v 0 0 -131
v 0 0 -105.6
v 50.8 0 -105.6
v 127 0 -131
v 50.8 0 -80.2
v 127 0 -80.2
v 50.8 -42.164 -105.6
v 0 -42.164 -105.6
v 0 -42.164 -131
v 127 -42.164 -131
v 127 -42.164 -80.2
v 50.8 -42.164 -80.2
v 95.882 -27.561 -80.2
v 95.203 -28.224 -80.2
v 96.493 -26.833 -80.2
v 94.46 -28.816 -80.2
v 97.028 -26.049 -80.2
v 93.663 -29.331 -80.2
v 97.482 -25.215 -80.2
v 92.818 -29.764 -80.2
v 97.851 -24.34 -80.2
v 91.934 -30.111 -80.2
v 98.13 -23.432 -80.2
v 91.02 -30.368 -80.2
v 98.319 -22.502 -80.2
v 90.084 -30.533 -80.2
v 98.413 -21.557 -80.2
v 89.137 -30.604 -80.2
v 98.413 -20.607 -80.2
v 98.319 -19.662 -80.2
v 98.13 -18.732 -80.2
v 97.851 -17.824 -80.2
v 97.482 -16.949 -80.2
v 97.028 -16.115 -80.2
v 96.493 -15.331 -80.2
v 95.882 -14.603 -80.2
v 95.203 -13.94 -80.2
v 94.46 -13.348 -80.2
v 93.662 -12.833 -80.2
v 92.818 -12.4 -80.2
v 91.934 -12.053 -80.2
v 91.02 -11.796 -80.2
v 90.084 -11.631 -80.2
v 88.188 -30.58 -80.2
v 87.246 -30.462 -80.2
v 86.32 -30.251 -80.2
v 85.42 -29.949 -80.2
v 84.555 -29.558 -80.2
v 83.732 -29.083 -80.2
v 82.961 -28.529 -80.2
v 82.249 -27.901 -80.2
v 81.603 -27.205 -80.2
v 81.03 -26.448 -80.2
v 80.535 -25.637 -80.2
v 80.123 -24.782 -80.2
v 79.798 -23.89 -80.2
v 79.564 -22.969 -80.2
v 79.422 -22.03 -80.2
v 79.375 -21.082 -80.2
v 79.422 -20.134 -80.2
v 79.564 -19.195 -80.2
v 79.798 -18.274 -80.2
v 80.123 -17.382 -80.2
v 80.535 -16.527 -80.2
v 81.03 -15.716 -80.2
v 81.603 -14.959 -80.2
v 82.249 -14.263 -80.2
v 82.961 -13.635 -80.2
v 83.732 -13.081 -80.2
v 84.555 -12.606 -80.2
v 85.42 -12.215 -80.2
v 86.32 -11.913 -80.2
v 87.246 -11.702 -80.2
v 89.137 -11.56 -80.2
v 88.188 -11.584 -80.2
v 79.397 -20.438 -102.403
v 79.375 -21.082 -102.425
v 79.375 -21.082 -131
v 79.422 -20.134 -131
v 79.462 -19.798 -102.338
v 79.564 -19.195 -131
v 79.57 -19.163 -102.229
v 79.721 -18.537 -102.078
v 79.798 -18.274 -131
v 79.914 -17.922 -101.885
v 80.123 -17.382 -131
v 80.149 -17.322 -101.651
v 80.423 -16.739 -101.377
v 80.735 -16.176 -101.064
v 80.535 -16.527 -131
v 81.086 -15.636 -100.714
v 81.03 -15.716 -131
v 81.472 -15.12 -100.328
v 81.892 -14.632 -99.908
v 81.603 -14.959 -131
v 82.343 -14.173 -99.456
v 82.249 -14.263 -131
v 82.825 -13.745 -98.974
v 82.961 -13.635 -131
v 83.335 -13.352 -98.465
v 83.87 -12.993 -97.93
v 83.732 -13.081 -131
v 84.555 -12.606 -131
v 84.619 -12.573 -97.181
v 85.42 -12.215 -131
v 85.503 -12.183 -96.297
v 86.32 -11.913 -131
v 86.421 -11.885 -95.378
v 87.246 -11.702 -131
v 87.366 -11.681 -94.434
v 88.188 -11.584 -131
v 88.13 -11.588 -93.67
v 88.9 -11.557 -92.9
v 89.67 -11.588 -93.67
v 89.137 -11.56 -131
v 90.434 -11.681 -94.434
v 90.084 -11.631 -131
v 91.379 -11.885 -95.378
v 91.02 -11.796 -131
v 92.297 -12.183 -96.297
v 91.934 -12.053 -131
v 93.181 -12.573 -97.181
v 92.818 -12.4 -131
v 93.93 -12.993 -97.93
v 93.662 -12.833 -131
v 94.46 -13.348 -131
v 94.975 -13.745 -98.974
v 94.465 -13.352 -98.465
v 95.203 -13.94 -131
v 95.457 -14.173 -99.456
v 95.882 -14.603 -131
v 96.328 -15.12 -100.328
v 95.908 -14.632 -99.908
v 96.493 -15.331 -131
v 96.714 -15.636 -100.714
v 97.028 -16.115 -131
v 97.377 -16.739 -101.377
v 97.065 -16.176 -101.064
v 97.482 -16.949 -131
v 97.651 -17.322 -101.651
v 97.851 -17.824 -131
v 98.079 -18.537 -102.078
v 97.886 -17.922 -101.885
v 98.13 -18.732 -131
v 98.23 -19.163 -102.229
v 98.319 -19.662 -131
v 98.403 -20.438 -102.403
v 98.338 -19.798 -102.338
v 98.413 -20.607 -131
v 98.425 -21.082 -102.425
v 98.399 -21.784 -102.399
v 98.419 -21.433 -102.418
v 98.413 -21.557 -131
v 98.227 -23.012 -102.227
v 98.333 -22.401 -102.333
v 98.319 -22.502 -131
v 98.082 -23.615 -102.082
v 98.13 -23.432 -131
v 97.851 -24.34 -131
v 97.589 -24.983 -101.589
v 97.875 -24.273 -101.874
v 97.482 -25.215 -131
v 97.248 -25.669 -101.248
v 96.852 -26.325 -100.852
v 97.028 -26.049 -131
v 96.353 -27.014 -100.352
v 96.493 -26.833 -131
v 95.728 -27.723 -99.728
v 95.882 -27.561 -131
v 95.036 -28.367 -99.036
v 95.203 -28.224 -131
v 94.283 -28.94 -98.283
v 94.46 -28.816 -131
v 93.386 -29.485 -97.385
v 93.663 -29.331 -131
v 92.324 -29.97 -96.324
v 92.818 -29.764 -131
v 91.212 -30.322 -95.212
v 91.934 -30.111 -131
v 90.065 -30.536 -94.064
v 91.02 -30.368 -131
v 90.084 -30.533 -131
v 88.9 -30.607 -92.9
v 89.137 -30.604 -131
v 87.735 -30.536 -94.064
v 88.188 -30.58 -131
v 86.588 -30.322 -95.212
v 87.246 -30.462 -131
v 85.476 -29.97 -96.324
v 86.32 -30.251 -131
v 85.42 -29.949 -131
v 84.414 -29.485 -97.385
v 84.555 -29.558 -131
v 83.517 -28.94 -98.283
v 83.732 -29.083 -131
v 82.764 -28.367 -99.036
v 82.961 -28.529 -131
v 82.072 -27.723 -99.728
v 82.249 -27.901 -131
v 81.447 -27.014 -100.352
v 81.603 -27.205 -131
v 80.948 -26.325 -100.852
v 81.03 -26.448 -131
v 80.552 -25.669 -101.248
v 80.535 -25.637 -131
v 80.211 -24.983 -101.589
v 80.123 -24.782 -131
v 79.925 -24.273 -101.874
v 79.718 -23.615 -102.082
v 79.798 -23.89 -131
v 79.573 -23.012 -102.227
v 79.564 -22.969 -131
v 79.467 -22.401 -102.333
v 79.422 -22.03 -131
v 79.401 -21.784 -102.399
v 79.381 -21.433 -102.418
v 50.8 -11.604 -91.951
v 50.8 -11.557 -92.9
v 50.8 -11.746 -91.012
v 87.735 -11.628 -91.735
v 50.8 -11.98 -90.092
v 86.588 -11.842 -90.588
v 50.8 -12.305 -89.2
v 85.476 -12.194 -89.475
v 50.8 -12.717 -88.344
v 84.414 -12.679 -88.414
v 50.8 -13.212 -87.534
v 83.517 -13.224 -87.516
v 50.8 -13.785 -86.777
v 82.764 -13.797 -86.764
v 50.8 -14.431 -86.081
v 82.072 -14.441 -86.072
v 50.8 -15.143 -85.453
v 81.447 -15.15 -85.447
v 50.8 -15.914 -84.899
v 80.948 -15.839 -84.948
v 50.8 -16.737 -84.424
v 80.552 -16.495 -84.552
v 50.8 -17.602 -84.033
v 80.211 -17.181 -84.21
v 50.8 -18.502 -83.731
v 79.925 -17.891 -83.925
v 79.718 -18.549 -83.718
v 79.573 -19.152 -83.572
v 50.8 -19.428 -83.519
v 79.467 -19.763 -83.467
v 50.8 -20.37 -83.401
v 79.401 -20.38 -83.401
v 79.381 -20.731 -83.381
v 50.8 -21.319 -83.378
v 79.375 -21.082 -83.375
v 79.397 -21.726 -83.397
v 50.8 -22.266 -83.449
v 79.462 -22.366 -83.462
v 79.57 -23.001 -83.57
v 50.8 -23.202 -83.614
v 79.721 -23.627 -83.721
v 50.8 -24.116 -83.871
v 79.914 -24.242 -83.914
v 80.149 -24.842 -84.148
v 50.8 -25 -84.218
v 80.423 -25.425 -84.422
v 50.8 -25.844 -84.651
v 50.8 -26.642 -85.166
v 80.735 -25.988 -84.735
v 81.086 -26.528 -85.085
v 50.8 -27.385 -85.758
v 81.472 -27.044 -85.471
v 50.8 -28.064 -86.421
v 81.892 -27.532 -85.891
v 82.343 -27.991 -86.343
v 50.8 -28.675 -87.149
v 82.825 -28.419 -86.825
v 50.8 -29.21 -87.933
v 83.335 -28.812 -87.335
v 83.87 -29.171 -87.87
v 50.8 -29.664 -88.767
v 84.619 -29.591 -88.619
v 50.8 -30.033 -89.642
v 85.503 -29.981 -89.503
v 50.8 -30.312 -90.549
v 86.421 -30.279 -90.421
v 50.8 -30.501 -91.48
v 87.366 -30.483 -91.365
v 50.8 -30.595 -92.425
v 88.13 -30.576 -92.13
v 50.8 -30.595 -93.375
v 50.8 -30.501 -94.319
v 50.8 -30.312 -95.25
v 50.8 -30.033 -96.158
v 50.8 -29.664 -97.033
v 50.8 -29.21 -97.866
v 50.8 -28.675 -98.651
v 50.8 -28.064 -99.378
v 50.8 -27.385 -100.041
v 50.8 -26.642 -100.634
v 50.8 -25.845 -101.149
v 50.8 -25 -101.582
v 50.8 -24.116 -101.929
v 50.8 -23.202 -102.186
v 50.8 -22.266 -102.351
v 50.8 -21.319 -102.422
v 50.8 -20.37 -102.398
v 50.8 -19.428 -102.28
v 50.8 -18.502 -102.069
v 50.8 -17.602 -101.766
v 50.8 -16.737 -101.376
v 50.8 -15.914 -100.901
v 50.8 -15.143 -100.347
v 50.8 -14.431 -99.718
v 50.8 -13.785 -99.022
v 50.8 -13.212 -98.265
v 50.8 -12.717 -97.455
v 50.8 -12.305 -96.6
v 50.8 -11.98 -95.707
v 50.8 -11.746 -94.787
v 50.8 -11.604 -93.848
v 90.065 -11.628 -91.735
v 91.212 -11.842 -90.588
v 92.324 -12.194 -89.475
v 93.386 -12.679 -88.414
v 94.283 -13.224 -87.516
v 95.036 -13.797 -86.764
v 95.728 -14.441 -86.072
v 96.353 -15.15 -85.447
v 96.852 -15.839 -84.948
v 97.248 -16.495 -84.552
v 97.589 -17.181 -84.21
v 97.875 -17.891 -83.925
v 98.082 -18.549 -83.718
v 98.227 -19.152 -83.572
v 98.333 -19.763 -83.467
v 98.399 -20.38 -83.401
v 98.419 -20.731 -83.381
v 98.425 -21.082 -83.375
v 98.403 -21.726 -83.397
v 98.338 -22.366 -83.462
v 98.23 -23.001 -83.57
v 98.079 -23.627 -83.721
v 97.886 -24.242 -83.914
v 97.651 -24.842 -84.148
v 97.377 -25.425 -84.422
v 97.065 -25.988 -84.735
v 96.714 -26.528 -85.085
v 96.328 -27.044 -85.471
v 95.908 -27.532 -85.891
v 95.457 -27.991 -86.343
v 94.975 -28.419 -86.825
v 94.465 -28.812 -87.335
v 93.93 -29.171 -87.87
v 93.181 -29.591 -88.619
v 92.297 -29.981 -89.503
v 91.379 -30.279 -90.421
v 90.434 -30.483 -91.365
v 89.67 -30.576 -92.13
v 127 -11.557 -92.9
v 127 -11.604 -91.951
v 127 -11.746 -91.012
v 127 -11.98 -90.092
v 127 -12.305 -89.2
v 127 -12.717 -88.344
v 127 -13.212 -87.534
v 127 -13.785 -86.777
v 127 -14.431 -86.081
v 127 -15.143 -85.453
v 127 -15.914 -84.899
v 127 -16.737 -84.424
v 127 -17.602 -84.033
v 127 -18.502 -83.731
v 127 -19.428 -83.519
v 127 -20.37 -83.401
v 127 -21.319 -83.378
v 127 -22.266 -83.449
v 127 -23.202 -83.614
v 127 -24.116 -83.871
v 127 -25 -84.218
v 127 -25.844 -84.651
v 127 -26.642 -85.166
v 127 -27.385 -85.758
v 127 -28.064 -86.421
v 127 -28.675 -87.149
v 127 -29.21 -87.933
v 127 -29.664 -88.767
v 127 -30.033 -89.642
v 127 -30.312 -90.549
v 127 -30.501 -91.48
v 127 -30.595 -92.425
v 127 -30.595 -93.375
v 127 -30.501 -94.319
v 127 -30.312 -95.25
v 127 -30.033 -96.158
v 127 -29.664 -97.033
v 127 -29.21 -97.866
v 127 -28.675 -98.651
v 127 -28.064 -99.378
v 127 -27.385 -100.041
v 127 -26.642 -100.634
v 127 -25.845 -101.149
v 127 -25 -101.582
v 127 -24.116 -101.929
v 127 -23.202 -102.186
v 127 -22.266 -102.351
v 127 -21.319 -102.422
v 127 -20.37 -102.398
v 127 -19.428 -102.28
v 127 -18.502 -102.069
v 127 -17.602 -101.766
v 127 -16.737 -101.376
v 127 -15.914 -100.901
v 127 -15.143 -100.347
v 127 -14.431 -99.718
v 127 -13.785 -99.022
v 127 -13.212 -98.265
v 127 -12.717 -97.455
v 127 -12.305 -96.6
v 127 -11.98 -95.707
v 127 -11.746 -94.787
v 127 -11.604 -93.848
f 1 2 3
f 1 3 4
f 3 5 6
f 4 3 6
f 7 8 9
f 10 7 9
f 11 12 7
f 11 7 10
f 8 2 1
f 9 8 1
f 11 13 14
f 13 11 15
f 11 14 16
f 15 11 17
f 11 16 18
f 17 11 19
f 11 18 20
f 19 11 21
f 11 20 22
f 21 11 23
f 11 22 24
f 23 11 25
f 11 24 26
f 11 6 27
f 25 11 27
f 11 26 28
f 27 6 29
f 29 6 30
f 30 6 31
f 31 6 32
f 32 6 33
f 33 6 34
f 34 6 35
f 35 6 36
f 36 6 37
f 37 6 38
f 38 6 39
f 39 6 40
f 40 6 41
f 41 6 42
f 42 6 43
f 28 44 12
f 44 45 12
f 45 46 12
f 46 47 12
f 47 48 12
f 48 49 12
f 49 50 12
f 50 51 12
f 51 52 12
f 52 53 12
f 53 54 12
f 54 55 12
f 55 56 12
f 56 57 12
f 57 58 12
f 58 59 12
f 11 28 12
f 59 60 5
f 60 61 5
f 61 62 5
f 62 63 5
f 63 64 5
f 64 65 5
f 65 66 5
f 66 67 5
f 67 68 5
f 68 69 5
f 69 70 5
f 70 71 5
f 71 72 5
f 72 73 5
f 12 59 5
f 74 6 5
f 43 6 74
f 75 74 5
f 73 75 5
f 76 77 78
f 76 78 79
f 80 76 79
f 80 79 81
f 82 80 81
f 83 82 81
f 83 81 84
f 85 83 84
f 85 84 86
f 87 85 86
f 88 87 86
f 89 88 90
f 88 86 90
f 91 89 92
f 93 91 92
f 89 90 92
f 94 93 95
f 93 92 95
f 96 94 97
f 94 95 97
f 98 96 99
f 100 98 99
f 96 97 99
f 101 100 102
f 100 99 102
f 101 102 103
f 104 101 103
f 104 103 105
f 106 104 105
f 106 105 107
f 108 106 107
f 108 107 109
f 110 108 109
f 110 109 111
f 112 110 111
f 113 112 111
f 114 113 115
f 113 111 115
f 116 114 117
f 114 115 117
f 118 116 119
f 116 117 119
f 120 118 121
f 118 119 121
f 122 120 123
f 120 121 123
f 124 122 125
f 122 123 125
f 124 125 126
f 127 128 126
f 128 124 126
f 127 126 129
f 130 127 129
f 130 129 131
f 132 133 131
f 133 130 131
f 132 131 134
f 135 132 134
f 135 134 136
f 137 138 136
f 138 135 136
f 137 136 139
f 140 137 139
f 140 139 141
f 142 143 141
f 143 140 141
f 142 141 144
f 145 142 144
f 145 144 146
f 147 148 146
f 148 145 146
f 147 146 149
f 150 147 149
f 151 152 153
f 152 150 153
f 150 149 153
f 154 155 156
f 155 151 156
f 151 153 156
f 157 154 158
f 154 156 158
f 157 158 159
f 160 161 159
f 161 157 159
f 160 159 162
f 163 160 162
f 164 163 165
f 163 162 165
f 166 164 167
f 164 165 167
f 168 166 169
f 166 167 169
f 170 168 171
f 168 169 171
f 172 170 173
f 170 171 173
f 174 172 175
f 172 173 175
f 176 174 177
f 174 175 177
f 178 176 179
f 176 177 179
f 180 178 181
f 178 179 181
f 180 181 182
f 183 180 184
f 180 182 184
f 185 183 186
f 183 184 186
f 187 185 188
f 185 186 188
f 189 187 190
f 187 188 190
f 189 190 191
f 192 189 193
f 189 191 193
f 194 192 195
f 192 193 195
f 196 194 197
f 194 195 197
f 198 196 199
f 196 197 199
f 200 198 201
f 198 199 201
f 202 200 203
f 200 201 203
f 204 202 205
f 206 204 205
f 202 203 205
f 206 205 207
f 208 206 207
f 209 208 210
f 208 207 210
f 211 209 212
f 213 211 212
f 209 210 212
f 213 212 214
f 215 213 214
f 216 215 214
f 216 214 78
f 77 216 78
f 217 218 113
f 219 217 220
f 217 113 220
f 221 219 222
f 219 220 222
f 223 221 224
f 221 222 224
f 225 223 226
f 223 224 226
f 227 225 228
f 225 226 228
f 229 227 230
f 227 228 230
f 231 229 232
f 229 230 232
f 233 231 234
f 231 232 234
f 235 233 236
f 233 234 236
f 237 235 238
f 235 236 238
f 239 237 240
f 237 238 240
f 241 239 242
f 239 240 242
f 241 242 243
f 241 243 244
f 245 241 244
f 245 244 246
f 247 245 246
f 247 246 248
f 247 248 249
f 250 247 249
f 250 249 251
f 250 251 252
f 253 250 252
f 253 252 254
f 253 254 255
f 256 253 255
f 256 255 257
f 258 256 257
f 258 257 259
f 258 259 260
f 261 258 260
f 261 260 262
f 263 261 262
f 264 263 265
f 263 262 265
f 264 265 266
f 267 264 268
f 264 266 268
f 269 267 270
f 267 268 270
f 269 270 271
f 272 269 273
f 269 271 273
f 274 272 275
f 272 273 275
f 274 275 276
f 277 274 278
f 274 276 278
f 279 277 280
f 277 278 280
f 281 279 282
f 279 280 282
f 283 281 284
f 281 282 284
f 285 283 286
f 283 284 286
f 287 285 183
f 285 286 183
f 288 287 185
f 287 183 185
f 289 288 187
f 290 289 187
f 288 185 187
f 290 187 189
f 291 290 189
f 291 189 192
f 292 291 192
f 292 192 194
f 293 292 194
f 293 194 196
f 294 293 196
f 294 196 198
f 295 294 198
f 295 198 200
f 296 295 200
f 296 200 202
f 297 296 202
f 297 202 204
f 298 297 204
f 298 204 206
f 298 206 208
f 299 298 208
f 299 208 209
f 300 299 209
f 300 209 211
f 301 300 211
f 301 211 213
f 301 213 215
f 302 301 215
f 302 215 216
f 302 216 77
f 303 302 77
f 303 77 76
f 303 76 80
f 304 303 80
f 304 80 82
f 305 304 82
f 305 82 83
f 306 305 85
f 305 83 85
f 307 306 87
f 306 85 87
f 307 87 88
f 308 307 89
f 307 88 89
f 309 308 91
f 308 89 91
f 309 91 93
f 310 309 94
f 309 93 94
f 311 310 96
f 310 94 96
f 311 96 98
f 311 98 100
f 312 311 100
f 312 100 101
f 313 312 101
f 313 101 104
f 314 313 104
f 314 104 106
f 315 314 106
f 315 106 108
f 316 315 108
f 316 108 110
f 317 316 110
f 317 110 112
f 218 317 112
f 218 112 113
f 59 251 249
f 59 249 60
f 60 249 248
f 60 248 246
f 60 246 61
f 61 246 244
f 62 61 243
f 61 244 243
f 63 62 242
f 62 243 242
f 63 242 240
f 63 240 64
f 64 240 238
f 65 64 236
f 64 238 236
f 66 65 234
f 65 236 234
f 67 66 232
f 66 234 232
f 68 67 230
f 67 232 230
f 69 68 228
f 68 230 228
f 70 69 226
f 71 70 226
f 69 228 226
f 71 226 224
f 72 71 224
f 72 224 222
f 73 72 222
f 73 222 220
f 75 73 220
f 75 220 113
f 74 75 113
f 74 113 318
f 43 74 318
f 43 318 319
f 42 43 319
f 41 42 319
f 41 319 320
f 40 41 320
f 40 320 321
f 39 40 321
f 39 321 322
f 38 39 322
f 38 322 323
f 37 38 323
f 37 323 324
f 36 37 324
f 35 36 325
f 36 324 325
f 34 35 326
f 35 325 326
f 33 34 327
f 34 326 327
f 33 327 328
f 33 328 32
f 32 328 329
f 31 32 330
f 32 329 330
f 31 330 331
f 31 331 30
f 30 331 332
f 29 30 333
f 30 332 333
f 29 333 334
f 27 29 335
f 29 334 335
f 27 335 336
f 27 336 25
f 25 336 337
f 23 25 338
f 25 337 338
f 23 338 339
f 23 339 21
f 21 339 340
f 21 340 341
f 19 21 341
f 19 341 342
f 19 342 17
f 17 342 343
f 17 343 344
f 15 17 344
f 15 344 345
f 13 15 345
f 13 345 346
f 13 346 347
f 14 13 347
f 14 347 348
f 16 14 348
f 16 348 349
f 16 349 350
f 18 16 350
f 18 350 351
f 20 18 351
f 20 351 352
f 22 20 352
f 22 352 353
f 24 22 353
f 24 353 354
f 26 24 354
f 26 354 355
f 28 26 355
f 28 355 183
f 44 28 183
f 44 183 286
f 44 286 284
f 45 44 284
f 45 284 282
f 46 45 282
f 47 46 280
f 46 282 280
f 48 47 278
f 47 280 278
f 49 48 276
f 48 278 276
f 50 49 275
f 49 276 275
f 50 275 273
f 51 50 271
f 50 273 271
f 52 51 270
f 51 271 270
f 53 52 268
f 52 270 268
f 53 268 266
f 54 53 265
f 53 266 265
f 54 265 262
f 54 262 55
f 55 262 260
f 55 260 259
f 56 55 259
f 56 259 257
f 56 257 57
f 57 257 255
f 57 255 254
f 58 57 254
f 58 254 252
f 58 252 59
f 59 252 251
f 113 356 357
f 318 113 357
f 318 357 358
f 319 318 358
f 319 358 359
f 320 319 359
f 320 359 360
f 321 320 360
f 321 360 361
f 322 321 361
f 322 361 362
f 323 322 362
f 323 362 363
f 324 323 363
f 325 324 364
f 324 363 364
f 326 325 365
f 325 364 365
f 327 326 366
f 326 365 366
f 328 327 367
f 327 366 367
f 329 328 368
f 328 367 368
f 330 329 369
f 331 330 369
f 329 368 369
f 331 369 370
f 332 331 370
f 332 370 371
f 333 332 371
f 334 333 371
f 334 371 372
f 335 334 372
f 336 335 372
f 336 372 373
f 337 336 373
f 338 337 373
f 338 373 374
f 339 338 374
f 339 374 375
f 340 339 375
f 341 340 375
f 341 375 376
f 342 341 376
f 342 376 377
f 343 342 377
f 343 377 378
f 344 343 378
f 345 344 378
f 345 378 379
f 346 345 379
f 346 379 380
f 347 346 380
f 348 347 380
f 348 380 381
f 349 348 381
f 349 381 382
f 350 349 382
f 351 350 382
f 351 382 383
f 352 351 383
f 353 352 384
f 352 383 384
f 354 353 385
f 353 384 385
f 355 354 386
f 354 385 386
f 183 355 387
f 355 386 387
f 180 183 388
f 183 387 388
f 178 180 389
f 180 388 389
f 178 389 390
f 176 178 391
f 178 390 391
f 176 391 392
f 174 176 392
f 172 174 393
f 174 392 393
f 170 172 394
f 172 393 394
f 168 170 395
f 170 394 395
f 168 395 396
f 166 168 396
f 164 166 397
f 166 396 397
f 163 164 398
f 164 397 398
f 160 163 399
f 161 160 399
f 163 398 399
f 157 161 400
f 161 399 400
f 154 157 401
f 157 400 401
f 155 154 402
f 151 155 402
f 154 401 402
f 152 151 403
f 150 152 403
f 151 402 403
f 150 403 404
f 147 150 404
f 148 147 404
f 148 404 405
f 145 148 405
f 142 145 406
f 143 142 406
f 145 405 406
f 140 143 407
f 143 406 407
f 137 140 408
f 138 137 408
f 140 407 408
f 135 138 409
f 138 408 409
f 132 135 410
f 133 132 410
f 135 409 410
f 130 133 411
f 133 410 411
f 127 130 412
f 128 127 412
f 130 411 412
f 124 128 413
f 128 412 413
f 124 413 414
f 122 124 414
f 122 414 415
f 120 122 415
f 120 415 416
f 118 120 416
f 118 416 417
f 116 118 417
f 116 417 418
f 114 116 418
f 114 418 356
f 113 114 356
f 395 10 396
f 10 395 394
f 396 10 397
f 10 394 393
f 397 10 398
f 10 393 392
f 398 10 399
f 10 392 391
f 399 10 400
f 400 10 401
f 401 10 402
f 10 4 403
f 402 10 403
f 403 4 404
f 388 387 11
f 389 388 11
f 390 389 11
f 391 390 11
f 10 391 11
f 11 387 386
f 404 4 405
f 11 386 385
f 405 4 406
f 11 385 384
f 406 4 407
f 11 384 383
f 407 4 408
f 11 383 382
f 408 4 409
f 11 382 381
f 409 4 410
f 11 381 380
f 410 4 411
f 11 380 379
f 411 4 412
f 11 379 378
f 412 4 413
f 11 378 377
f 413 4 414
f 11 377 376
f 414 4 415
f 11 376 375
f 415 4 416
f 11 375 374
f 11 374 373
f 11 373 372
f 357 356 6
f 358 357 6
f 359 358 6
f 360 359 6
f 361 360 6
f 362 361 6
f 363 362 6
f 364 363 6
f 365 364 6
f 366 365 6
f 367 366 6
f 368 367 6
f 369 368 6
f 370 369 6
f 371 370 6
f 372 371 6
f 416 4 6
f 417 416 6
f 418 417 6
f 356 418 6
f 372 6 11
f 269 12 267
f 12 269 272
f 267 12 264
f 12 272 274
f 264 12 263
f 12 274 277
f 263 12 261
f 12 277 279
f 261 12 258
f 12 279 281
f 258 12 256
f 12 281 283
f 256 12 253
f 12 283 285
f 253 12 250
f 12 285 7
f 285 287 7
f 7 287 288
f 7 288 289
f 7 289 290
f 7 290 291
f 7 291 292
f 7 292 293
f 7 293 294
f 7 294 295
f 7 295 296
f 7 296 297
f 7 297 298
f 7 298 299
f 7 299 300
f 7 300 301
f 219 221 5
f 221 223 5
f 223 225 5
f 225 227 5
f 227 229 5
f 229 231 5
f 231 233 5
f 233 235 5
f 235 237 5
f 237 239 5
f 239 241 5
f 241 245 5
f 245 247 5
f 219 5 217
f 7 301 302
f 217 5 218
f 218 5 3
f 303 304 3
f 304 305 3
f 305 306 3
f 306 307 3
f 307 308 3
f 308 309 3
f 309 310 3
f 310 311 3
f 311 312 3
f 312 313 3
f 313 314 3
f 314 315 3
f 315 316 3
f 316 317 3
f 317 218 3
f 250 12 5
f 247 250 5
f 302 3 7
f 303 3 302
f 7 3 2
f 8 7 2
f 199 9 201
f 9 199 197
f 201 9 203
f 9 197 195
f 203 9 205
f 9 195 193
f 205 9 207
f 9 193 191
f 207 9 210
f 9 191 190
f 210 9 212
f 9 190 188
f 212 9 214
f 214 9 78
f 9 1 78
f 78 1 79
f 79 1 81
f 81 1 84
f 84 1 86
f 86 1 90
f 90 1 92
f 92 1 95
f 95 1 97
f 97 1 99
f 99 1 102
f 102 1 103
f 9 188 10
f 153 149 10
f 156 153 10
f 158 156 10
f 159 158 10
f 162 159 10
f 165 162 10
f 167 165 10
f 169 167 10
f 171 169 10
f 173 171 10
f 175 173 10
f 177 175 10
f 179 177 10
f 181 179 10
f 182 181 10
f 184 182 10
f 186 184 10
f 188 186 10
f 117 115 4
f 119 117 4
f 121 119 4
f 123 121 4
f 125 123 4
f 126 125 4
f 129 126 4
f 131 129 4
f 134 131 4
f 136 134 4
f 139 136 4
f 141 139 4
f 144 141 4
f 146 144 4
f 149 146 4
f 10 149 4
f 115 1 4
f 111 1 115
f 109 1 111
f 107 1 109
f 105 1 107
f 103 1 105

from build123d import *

# Parameters (mm, degrees)
F1_DEPTH = 42.164
F3_D     = 19.05
F5_D     = 19.05


with BuildPart() as f1:
    # F0 (on Front) → F1 (new body)
    with BuildSketch(Plane.XZ):
        Polygon((127, -80.199791), (50.8, -80.199791), (50.8, -105.599791), (0, -105.599791), (0, -130.999791), (127, -130.999791), align=None)
    extrude(amount=F1_DEPTH)

    # F3 (through all)
    with Locations(Plane(origin=(50.8, 0, 0), x_dir=(0, -1, 0), z_dir=(-1, 0, 0))):
        with Locations((21.082, -92.899791)):
            Hole(F3_D / 2)

    # F5 (through all)
    with Locations(Plane.XY.offset(-80.199791)):
        with Locations((88.9, -21.082)):
            Hole(F5_D / 2)


solid = f1.part
